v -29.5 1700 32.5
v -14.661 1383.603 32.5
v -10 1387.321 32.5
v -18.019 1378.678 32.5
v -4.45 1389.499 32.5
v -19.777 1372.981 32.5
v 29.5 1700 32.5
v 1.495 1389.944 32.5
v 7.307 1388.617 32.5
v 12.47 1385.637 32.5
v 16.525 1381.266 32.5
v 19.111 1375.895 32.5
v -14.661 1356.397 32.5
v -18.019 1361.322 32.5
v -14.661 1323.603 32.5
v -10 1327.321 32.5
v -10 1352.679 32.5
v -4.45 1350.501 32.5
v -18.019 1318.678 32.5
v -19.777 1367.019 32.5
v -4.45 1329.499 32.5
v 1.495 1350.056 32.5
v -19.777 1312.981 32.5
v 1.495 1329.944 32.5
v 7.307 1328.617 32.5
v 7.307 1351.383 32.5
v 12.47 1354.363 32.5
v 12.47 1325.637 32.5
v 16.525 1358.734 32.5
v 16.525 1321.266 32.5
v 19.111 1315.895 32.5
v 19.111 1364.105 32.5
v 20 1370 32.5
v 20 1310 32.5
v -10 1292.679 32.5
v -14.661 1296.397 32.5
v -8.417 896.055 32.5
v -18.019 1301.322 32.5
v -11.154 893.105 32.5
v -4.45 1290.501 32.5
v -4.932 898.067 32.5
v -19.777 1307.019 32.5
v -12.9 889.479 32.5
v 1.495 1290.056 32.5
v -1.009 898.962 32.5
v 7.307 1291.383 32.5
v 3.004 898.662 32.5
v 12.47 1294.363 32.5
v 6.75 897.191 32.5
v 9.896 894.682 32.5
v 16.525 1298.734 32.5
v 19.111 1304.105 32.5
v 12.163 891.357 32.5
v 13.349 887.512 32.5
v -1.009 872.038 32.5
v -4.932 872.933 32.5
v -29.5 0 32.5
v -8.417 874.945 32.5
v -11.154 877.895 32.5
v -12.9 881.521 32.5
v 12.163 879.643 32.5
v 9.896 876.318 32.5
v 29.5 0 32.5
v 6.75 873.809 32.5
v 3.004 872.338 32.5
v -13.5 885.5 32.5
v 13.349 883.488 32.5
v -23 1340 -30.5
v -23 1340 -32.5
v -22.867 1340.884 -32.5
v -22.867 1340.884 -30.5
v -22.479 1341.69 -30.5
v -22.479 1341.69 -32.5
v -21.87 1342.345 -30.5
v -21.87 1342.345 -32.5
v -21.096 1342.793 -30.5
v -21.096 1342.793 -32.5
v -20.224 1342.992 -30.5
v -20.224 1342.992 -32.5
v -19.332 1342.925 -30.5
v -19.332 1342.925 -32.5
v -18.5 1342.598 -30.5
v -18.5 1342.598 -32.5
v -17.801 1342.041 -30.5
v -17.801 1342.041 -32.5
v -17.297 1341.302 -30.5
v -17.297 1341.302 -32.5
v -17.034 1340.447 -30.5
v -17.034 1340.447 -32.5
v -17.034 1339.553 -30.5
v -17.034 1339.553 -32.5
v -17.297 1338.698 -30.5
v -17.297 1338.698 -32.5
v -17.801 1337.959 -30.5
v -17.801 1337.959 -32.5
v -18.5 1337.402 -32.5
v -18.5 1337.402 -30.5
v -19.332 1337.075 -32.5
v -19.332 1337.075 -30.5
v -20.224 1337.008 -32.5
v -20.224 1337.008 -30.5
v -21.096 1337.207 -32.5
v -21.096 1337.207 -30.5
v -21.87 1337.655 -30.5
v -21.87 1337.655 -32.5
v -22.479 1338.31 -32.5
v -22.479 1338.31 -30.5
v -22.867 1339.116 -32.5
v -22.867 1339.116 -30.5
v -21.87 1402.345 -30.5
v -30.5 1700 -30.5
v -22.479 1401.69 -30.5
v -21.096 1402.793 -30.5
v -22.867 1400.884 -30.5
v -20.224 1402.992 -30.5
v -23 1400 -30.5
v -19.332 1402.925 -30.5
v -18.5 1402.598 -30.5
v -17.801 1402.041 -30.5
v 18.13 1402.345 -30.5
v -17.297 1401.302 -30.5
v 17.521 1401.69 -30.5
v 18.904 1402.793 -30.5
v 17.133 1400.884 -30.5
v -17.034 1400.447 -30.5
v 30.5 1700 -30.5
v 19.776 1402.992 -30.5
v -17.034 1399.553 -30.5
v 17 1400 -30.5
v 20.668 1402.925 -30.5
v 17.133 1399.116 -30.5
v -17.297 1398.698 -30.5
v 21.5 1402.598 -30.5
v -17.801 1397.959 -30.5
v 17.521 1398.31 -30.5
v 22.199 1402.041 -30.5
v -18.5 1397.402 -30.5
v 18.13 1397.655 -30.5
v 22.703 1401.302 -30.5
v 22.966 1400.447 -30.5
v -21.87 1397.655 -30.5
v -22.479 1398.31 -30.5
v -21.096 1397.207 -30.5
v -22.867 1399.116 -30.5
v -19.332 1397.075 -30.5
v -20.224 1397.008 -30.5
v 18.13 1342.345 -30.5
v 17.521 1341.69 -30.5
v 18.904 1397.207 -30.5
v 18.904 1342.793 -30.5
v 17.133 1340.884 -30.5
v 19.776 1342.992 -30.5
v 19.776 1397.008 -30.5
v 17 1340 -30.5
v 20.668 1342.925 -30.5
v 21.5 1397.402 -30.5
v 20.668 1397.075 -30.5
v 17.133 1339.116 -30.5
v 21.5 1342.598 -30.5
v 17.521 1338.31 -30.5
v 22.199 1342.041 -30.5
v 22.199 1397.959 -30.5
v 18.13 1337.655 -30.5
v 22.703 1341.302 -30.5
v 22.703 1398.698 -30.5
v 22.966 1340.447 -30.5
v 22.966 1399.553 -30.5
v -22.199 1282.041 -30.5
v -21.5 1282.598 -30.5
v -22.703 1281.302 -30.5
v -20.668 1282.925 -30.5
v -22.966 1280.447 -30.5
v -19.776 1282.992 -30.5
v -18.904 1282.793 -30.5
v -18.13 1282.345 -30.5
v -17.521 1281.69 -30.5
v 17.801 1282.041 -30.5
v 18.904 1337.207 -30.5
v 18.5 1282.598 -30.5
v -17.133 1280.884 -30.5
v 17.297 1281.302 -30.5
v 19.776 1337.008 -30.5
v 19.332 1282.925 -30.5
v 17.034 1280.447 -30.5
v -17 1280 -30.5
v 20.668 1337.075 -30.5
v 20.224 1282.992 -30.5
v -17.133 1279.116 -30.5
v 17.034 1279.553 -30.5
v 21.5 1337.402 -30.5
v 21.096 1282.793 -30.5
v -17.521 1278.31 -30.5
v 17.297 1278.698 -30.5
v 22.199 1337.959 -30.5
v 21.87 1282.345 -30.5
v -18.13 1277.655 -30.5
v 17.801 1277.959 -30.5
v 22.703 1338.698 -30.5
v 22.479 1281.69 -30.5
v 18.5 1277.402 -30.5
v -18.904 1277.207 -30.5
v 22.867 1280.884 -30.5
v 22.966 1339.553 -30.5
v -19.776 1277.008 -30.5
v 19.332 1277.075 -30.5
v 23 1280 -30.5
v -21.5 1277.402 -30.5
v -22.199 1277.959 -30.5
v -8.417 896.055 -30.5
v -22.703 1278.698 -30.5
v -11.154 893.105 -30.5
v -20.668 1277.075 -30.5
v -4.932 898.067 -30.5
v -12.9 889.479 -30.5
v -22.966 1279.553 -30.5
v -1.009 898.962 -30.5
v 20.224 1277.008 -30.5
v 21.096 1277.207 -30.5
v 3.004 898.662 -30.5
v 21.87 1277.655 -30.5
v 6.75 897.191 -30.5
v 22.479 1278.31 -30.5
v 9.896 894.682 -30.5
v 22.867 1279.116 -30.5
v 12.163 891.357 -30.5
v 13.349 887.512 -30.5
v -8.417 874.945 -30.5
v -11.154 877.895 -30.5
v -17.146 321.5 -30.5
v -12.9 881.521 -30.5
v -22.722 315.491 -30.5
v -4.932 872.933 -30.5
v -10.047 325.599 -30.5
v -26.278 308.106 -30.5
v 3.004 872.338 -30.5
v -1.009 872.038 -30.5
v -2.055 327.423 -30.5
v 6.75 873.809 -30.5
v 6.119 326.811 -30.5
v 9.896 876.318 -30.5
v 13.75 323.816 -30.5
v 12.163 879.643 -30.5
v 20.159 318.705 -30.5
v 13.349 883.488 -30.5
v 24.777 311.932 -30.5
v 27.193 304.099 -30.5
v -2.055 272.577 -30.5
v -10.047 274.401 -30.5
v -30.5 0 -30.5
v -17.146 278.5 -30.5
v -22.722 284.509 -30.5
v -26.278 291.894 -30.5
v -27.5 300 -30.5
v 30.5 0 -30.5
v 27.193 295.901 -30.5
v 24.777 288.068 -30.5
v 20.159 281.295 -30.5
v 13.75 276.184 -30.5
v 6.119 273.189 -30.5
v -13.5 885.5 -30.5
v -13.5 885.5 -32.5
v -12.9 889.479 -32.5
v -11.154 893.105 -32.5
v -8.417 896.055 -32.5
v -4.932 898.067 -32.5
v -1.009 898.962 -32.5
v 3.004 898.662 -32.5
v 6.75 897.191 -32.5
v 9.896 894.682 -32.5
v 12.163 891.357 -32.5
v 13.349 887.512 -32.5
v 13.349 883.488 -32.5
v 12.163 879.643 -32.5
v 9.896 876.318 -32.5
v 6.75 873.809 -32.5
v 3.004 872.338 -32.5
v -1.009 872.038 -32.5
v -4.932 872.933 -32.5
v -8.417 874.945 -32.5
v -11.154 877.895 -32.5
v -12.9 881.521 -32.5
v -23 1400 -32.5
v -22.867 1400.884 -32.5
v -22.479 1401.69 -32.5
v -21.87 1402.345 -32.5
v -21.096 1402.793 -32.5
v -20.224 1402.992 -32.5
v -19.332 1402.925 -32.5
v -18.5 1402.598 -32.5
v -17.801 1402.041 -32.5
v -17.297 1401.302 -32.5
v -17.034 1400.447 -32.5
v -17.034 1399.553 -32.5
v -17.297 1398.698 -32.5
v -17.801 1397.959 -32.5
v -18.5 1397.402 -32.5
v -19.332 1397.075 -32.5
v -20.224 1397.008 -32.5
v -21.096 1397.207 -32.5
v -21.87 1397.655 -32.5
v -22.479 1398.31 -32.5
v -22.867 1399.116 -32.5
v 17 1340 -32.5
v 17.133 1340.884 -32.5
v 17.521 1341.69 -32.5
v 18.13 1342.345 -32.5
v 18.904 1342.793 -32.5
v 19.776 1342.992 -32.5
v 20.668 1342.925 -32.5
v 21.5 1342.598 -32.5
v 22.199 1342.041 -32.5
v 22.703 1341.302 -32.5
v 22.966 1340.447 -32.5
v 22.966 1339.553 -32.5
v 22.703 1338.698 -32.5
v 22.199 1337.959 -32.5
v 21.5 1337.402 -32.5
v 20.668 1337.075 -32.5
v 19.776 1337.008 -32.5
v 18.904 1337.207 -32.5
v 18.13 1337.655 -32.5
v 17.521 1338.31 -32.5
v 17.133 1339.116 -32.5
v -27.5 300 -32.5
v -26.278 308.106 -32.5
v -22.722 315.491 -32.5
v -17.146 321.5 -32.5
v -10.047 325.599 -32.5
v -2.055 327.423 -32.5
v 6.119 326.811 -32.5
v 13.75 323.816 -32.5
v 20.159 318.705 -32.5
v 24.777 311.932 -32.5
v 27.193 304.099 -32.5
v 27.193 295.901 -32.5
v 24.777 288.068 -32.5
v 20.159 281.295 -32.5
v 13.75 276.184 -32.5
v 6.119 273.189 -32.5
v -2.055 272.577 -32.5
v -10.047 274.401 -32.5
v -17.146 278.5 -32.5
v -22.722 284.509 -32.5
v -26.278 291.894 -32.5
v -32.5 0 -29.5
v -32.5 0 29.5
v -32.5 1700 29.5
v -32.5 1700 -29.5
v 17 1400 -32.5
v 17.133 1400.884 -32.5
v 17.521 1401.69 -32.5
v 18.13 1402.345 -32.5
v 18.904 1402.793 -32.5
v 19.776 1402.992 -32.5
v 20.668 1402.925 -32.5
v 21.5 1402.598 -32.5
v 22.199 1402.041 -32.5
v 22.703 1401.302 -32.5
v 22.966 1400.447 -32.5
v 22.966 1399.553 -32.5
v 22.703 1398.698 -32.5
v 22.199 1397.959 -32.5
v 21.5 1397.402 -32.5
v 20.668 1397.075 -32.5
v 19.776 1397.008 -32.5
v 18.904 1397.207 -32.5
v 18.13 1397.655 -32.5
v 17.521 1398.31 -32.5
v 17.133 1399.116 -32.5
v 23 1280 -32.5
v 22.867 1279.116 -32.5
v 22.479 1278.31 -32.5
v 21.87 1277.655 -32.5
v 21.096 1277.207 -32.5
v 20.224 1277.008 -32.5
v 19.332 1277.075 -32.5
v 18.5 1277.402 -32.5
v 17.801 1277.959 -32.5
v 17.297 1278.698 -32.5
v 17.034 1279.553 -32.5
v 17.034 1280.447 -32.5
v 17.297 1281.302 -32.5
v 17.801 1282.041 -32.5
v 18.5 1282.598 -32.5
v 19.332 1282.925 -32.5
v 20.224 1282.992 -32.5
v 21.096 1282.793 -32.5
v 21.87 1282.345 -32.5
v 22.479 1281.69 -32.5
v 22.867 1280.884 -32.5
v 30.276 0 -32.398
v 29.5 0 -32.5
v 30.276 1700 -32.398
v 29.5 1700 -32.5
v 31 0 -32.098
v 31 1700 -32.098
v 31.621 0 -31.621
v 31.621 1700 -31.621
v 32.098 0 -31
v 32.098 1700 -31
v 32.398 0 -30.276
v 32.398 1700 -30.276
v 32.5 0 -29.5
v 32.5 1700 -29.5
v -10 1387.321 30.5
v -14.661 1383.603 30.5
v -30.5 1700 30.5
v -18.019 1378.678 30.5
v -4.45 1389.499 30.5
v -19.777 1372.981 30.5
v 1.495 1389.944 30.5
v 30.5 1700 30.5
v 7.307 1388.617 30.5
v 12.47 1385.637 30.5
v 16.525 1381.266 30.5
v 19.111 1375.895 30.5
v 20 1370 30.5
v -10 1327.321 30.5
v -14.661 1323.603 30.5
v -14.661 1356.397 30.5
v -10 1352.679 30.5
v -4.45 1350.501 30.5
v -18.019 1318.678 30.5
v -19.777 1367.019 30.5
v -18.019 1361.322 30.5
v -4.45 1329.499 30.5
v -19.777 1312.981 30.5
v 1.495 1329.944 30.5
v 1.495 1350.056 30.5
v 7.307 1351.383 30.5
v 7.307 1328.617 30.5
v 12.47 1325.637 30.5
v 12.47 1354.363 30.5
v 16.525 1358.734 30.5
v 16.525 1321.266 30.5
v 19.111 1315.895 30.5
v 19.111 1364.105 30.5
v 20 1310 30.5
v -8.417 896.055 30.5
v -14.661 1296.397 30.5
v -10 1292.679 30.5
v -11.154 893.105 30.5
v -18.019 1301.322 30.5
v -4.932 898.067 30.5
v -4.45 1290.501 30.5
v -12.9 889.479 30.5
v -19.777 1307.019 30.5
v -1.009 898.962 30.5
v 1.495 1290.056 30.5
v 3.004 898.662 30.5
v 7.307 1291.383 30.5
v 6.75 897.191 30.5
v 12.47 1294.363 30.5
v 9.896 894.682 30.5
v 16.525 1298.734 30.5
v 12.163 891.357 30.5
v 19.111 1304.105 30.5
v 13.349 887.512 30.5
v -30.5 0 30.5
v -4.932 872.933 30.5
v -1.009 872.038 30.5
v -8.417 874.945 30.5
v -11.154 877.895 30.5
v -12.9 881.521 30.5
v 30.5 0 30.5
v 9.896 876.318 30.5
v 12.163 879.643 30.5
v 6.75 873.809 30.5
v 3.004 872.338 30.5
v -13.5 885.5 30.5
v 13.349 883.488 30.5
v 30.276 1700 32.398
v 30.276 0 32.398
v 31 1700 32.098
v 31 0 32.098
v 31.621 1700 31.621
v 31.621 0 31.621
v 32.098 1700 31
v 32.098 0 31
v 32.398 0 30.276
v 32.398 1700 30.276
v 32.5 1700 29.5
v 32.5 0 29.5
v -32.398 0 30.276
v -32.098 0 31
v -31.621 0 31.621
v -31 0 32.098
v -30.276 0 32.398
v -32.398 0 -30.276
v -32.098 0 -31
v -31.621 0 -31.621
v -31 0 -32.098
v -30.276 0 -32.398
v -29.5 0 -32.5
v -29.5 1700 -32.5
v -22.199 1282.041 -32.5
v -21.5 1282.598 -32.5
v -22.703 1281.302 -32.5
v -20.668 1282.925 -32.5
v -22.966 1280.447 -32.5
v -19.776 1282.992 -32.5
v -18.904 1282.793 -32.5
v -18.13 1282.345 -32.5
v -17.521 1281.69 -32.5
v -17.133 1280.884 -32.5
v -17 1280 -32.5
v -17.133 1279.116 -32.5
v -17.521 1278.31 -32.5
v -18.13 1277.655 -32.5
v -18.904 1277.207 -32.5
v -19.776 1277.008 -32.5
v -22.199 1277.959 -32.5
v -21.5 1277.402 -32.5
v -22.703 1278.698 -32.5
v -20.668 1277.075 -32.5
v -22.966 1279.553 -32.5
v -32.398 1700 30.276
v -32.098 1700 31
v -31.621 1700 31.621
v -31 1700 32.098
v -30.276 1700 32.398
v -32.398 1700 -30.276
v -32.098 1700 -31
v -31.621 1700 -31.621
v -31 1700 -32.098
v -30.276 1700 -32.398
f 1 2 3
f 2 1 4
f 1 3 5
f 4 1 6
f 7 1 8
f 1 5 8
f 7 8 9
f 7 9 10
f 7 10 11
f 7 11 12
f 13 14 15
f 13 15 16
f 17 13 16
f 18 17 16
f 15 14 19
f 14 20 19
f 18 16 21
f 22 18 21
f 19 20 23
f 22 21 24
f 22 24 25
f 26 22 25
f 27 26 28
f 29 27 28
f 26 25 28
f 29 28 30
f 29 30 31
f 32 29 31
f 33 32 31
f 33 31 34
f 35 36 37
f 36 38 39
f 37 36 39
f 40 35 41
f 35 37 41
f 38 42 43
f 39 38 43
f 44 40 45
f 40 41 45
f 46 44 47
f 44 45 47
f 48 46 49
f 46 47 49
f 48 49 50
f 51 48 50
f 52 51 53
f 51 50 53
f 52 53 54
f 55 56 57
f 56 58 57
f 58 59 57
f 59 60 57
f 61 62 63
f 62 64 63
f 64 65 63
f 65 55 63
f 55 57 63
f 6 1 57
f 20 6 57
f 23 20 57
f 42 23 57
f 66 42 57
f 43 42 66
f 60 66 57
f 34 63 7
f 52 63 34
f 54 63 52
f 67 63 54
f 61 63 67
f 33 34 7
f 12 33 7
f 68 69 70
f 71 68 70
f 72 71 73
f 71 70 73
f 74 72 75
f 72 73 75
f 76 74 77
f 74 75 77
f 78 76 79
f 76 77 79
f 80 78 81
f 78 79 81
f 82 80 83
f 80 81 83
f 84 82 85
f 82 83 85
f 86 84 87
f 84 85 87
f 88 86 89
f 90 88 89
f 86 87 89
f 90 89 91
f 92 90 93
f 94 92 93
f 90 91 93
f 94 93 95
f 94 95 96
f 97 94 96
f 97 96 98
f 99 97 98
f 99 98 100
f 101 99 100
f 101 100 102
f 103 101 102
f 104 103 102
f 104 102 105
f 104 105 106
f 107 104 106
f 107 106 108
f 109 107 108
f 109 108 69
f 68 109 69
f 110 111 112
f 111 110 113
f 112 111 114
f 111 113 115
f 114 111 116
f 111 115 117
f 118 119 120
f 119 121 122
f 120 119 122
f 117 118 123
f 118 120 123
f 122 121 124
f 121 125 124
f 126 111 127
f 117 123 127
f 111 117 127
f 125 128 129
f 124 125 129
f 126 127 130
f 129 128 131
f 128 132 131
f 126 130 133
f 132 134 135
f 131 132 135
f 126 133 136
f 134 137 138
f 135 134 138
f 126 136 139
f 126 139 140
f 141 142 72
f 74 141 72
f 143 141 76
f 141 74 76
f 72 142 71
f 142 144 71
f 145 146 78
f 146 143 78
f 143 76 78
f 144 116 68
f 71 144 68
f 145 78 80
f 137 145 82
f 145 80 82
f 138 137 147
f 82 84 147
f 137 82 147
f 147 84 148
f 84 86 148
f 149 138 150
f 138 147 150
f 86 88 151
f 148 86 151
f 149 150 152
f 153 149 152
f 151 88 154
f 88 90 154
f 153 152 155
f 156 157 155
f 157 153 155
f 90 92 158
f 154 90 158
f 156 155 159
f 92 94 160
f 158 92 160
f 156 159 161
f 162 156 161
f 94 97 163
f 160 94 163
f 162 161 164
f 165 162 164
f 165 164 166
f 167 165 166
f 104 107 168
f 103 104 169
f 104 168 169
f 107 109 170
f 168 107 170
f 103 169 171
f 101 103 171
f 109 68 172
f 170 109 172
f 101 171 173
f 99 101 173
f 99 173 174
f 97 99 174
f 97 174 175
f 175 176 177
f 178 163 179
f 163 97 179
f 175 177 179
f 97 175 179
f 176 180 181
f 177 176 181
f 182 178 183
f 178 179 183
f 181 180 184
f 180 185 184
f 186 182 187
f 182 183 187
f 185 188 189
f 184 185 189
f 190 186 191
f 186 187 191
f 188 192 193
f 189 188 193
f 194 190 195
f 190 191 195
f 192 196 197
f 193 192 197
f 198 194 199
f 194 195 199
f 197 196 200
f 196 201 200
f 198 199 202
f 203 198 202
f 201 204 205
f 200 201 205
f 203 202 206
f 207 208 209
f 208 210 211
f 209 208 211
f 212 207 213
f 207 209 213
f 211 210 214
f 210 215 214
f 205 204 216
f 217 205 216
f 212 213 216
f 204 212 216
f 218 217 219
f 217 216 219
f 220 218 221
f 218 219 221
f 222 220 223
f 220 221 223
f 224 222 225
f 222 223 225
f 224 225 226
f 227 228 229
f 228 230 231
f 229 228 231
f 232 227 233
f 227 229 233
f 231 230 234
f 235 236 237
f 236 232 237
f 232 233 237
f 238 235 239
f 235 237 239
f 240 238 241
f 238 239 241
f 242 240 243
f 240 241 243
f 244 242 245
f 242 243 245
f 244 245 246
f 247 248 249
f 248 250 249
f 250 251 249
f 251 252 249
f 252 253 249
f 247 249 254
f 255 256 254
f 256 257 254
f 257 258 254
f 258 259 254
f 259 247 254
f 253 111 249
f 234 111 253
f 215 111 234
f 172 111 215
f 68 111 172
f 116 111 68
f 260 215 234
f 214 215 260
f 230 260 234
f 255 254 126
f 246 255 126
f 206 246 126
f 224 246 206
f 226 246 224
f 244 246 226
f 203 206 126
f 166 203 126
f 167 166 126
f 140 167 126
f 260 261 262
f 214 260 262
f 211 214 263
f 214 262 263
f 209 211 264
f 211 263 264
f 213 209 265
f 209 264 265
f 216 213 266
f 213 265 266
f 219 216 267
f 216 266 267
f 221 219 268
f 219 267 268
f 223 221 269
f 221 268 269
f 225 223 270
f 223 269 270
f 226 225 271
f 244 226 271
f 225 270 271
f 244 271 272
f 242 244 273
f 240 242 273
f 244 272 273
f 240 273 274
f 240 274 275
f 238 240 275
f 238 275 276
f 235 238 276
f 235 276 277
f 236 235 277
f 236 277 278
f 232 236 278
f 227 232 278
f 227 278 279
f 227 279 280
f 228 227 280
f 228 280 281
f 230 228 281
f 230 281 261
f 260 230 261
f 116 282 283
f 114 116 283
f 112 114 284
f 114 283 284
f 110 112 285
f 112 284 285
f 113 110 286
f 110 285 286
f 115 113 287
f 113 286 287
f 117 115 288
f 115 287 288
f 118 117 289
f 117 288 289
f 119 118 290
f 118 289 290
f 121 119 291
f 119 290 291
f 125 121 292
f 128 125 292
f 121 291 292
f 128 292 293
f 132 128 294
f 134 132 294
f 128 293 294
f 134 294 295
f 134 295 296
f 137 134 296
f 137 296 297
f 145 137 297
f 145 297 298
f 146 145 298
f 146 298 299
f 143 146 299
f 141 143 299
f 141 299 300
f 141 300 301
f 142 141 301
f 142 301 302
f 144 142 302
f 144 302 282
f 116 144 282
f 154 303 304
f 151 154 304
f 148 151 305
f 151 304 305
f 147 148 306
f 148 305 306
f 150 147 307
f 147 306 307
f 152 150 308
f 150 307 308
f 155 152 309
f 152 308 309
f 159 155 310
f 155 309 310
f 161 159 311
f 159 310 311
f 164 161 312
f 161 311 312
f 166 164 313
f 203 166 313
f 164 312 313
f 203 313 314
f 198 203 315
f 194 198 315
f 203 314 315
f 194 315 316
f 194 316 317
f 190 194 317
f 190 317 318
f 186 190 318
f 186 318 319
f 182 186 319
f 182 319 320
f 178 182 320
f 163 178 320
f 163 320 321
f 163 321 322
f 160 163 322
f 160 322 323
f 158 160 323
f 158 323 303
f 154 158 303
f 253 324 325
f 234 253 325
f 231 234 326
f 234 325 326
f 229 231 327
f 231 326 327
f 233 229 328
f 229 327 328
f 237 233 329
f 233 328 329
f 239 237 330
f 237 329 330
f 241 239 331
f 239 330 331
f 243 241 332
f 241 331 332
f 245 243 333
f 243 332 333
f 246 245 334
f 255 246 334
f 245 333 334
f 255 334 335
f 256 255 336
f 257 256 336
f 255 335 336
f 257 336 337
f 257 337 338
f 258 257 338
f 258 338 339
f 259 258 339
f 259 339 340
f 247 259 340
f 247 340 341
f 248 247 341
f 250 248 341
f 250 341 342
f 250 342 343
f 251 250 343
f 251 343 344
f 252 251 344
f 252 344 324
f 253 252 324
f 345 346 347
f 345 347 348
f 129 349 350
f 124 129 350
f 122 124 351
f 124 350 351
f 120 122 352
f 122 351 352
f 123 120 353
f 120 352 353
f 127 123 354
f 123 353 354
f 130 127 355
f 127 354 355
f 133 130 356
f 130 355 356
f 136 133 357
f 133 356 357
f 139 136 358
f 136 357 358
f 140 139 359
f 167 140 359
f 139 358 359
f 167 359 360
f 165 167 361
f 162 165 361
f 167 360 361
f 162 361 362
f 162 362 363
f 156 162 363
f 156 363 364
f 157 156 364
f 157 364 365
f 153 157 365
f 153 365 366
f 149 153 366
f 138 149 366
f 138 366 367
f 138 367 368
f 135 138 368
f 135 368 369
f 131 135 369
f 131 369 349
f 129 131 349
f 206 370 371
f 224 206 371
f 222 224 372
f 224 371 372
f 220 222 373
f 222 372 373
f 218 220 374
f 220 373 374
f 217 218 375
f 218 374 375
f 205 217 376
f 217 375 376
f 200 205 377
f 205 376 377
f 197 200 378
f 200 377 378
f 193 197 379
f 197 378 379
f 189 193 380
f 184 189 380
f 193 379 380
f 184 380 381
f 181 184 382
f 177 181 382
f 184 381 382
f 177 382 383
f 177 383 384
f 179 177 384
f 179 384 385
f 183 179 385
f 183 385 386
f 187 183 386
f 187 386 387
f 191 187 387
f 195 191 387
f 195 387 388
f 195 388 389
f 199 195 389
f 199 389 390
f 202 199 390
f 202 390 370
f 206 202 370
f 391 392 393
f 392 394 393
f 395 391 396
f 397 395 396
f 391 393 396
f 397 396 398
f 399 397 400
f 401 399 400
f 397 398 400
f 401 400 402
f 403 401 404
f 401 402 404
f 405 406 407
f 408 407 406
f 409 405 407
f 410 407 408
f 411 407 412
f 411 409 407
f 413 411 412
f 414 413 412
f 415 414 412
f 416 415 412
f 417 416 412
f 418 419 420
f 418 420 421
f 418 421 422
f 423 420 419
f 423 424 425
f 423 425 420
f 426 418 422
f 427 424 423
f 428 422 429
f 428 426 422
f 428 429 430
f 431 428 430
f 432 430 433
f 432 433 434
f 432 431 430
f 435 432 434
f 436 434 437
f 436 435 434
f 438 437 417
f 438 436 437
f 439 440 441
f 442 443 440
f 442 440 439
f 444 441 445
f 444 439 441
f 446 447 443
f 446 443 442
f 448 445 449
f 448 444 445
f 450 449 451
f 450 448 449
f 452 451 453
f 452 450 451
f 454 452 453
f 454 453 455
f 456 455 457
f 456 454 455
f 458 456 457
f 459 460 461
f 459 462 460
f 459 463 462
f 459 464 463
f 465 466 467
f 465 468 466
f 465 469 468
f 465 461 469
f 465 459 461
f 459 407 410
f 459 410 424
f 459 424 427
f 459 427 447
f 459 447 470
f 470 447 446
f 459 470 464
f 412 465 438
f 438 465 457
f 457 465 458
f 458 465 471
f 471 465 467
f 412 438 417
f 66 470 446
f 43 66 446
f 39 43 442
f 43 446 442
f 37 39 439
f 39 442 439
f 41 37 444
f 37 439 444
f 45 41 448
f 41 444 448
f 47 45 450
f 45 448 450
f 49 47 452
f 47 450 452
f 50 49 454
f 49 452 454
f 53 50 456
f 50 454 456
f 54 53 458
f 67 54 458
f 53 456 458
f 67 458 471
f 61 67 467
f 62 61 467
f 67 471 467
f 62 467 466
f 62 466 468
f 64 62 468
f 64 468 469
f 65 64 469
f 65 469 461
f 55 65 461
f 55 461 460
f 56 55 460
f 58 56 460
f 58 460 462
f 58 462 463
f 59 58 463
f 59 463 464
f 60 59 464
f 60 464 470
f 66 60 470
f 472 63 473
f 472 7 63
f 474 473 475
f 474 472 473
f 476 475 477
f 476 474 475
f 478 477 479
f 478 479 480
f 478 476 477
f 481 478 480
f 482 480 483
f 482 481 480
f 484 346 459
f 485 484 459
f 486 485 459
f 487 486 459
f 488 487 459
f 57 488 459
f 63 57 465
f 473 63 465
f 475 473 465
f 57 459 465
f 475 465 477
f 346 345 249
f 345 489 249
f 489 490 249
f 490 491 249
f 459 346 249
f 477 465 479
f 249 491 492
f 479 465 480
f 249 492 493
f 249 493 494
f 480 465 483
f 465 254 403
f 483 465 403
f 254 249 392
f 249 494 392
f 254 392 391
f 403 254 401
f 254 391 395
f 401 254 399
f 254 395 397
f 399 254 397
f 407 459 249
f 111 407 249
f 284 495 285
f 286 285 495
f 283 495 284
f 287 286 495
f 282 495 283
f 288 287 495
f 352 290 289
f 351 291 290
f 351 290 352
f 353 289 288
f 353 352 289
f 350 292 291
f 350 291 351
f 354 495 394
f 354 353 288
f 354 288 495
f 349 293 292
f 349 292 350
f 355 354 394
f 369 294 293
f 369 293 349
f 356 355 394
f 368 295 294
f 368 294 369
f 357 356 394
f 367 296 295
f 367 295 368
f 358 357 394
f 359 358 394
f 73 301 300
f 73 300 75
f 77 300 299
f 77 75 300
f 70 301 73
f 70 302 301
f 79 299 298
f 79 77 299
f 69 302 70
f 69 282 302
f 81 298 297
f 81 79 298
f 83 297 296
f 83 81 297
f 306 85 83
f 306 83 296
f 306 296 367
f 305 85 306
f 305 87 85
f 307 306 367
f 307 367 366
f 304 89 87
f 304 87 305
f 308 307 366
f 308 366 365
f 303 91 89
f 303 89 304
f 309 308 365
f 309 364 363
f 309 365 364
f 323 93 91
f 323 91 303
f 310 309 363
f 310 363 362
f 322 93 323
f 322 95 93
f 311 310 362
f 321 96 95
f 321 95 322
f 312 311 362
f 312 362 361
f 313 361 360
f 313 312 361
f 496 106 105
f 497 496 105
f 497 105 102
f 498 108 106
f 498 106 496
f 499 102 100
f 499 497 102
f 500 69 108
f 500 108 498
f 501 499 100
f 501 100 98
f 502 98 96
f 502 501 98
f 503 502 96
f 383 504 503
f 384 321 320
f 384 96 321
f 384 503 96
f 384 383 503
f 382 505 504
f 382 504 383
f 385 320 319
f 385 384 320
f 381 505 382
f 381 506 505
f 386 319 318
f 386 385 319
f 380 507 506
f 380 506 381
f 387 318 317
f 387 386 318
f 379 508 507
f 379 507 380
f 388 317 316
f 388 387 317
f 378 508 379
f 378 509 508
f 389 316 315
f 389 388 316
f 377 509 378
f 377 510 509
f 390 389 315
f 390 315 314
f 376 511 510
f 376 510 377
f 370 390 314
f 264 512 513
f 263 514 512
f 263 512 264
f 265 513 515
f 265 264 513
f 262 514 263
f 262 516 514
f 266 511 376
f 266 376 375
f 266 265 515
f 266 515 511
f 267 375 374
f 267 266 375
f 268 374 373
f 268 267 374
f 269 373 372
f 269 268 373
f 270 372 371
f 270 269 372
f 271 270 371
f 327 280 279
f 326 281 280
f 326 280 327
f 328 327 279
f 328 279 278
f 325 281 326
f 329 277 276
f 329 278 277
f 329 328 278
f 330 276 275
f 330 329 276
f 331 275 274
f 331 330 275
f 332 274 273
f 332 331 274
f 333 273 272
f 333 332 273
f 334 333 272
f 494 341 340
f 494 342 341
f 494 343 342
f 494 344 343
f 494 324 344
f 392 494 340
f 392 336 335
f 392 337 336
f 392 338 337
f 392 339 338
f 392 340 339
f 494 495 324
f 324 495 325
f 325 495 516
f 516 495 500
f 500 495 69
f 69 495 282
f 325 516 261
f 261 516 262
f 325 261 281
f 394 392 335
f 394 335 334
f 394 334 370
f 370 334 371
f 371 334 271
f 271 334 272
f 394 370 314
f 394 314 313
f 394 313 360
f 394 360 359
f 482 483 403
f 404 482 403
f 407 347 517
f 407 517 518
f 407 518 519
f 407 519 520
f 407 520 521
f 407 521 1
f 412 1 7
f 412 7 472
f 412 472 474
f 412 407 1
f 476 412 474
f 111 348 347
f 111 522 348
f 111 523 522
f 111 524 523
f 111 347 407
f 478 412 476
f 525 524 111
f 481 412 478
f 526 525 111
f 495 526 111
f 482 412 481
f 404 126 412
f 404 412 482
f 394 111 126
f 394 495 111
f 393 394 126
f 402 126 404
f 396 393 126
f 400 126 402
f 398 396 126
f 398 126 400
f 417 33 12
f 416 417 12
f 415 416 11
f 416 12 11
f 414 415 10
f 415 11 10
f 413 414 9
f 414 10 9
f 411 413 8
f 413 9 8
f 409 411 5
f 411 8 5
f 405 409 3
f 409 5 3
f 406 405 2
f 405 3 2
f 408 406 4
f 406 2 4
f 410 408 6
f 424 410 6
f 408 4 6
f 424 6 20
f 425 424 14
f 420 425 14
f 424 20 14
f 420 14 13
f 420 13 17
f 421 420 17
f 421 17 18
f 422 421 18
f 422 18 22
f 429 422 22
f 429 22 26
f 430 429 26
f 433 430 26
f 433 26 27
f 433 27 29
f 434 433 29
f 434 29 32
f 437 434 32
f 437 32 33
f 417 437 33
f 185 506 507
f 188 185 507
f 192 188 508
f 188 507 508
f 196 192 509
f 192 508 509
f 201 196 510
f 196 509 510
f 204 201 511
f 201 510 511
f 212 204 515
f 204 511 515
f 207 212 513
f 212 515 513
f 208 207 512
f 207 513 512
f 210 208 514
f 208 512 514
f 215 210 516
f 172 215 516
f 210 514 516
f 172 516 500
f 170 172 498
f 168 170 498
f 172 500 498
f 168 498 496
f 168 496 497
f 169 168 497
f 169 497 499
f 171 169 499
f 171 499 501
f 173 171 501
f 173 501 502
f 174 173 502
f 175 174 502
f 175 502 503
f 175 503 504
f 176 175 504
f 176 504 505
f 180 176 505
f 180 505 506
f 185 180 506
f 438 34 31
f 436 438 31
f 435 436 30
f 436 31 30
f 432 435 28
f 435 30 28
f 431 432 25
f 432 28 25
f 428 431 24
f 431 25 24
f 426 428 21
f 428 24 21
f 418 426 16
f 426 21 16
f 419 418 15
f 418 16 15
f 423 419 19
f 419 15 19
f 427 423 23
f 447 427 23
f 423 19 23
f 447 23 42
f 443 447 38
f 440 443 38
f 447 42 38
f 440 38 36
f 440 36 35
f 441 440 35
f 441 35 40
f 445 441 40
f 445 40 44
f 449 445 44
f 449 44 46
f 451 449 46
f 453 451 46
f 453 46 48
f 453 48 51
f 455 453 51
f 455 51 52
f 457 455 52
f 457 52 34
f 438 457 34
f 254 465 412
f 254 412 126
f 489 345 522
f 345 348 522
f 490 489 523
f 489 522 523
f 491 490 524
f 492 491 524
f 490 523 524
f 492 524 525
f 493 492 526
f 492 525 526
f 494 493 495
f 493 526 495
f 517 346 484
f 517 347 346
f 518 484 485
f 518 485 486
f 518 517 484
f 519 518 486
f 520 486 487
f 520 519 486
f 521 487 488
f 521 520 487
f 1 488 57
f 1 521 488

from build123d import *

# Parameters (mm, degrees)
SKETCH1_W           = 65
SKETCH1_H           = 65
SKETCH1_W_2         = 61
SKETCH1_H_2         = 61
BOSS_EXTRUDE1_DEPTH = 1700
CUT_EXTRUDE1_REACH  = 1703.553
SKETCH2_R           = 3
SKETCH2_R_2         = 27.5
FILLET1_R           = 3
CUT_EXTRUDE2_REACH  = 1703.553
SKETCH3_R           = 20
SKETCH4_R           = 13.5
CUT_EXTRUDE3_DEPTH  = 1702.552599833


with BuildPart() as part:
    # Sketch1 → Boss-Extrude1 (new body)
    with BuildSketch(Plane(origin=(0, 0, 0), x_dir=(1, 0, 0), z_dir=(0, 1, 0))):
        Rectangle(SKETCH1_W, SKETCH1_H)
        Rectangle(SKETCH1_W_2, SKETCH1_H_2, mode=Mode.SUBTRACT)
    extrude(amount=BOSS_EXTRUDE1_DEPTH)

    # Sketch2 → Cut-Extrude1 (cut, up to next)
    with BuildSketch(Plane(origin=(0, 0, -32.5), x_dir=(-1, 0, 0), z_dir=(0, 0, -1)), mode=Mode.PRIVATE) as cut_extrude1_sk1:
        with Locations((20, 1400)):
            Circle(SKETCH2_R)
    cut_extrude1_tool1 = extrude(cut_extrude1_sk1.sketch, amount=-CUT_EXTRUDE1_REACH, mode=Mode.PRIVATE) & part.part
    # Sketch2 → Cut-Extrude1 (cut, up to next)
    with BuildSketch(Plane(origin=(0, 0, -32.5), x_dir=(-1, 0, 0), z_dir=(0, 0, -1)), mode=Mode.PRIVATE) as cut_extrude1_sk2:
        with Locations((-20, 1400)):
            Circle(SKETCH2_R)
    cut_extrude1_tool2 = extrude(cut_extrude1_sk2.sketch, amount=-CUT_EXTRUDE1_REACH, mode=Mode.PRIVATE) & part.part
    # Sketch2 → Cut-Extrude1 (cut, up to next)
    with BuildSketch(Plane(origin=(0, 0, -32.5), x_dir=(-1, 0, 0), z_dir=(0, 0, -1)), mode=Mode.PRIVATE) as cut_extrude1_sk3:
        with Locations((20, 1340)):
            Circle(SKETCH2_R)
    cut_extrude1_tool3 = extrude(cut_extrude1_sk3.sketch, amount=-CUT_EXTRUDE1_REACH, mode=Mode.PRIVATE) & part.part
    # Sketch2 → Cut-Extrude1 (cut, up to next)
    with BuildSketch(Plane(origin=(0, 0, -32.5), x_dir=(-1, 0, 0), z_dir=(0, 0, -1)), mode=Mode.PRIVATE) as cut_extrude1_sk4:
        with Locations((-20, 1340)):
            Circle(SKETCH2_R)
    cut_extrude1_tool4 = extrude(cut_extrude1_sk4.sketch, amount=-CUT_EXTRUDE1_REACH, mode=Mode.PRIVATE) & part.part
    # Sketch2 → Cut-Extrude1 (cut, up to next)
    with BuildSketch(Plane(origin=(0, 0, -32.5), x_dir=(-1, 0, 0), z_dir=(0, 0, -1)), mode=Mode.PRIVATE) as cut_extrude1_sk5:
        with Locations(Location((-20, 1280, 0), (0, 0, 180))):
            Circle(SKETCH2_R)
    cut_extrude1_tool5 = extrude(cut_extrude1_sk5.sketch, amount=-CUT_EXTRUDE1_REACH, mode=Mode.PRIVATE) & part.part
    # Sketch2 → Cut-Extrude1 (cut, up to next)
    with BuildSketch(Plane(origin=(0, 0, -32.5), x_dir=(-1, 0, 0), z_dir=(0, 0, -1)), mode=Mode.PRIVATE) as cut_extrude1_sk6:
        with Locations(Location((20, 1280, 0), (0, 0, 180))):
            Circle(SKETCH2_R)
    cut_extrude1_tool6 = extrude(cut_extrude1_sk6.sketch, amount=-CUT_EXTRUDE1_REACH, mode=Mode.PRIVATE) & part.part
    # Sketch2 → Cut-Extrude1 (cut, up to next)
    with BuildSketch(Plane(origin=(0, 0, -32.5), x_dir=(-1, 0, 0), z_dir=(0, 0, -1)), mode=Mode.PRIVATE) as cut_extrude1_sk7:
        with Locations((0, 300)):
            Circle(SKETCH2_R_2)
    cut_extrude1_tool7 = extrude(cut_extrude1_sk7.sketch, amount=-CUT_EXTRUDE1_REACH, mode=Mode.PRIVATE) & part.part
    add(cut_extrude1_tool1.solids().sort_by_distance((-20, 1400, -32.5))[0], mode=Mode.SUBTRACT)
    add(cut_extrude1_tool2.solids().sort_by_distance((20, 1400, -32.5))[0], mode=Mode.SUBTRACT)
    add(cut_extrude1_tool3.solids().sort_by_distance((-20, 1340, -32.5))[0], mode=Mode.SUBTRACT)
    add(cut_extrude1_tool4.solids().sort_by_distance((20, 1340, -32.5))[0], mode=Mode.SUBTRACT)
    add(cut_extrude1_tool5.solids().sort_by_distance((20, 1280, -32.5))[0], mode=Mode.SUBTRACT)
    add(cut_extrude1_tool6.solids().sort_by_distance((-20, 1280, -32.5))[0], mode=Mode.SUBTRACT)
    add(cut_extrude1_tool7.solids().sort_by_distance((0, 300, -32.5))[0], mode=Mode.SUBTRACT)

    # Fillet1
    fillet1_edges = [part.edges().sort_by_distance(p)[0] for p in [
        (32.5, 850, 32.5),
        (-32.5, 850, 32.5),
        (-32.5, 850, -32.5),
        (32.5, 850, -32.5),
    ]]
    fillet(fillet1_edges, radius=FILLET1_R)

    # Sketch3 → Cut-Extrude2 (cut, up to next)
    with BuildSketch(Plane.XY.offset(32.5), mode=Mode.PRIVATE) as cut_extrude2_sk1:
        with Locations((0, 1370)):
            Circle(SKETCH3_R)
    cut_extrude2_tool1 = extrude(cut_extrude2_sk1.sketch, amount=-CUT_EXTRUDE2_REACH, mode=Mode.PRIVATE) & part.part
    # Sketch3 → Cut-Extrude2 (cut, up to next)
    with BuildSketch(Plane.XY.offset(32.5), mode=Mode.PRIVATE) as cut_extrude2_sk2:
        with Locations((0, 1310)):
            Circle(SKETCH3_R)
    cut_extrude2_tool2 = extrude(cut_extrude2_sk2.sketch, amount=-CUT_EXTRUDE2_REACH, mode=Mode.PRIVATE) & part.part
    add(cut_extrude2_tool1.solids().sort_by_distance((0, 1370, 32.5))[0], mode=Mode.SUBTRACT)
    add(cut_extrude2_tool2.solids().sort_by_distance((0, 1310, 32.5))[0], mode=Mode.SUBTRACT)

    # Sketch4 → Cut-Extrude3 (cut, through all)
    with BuildSketch(Plane(origin=(0, 0, -32.5), x_dir=(-1, 0, 0), z_dir=(0, 0, -1))):
        with Locations((0, 885.5)):
            Circle(SKETCH4_R)
    extrude(amount=-CUT_EXTRUDE3_DEPTH, mode=Mode.SUBTRACT)


solid = part.part
